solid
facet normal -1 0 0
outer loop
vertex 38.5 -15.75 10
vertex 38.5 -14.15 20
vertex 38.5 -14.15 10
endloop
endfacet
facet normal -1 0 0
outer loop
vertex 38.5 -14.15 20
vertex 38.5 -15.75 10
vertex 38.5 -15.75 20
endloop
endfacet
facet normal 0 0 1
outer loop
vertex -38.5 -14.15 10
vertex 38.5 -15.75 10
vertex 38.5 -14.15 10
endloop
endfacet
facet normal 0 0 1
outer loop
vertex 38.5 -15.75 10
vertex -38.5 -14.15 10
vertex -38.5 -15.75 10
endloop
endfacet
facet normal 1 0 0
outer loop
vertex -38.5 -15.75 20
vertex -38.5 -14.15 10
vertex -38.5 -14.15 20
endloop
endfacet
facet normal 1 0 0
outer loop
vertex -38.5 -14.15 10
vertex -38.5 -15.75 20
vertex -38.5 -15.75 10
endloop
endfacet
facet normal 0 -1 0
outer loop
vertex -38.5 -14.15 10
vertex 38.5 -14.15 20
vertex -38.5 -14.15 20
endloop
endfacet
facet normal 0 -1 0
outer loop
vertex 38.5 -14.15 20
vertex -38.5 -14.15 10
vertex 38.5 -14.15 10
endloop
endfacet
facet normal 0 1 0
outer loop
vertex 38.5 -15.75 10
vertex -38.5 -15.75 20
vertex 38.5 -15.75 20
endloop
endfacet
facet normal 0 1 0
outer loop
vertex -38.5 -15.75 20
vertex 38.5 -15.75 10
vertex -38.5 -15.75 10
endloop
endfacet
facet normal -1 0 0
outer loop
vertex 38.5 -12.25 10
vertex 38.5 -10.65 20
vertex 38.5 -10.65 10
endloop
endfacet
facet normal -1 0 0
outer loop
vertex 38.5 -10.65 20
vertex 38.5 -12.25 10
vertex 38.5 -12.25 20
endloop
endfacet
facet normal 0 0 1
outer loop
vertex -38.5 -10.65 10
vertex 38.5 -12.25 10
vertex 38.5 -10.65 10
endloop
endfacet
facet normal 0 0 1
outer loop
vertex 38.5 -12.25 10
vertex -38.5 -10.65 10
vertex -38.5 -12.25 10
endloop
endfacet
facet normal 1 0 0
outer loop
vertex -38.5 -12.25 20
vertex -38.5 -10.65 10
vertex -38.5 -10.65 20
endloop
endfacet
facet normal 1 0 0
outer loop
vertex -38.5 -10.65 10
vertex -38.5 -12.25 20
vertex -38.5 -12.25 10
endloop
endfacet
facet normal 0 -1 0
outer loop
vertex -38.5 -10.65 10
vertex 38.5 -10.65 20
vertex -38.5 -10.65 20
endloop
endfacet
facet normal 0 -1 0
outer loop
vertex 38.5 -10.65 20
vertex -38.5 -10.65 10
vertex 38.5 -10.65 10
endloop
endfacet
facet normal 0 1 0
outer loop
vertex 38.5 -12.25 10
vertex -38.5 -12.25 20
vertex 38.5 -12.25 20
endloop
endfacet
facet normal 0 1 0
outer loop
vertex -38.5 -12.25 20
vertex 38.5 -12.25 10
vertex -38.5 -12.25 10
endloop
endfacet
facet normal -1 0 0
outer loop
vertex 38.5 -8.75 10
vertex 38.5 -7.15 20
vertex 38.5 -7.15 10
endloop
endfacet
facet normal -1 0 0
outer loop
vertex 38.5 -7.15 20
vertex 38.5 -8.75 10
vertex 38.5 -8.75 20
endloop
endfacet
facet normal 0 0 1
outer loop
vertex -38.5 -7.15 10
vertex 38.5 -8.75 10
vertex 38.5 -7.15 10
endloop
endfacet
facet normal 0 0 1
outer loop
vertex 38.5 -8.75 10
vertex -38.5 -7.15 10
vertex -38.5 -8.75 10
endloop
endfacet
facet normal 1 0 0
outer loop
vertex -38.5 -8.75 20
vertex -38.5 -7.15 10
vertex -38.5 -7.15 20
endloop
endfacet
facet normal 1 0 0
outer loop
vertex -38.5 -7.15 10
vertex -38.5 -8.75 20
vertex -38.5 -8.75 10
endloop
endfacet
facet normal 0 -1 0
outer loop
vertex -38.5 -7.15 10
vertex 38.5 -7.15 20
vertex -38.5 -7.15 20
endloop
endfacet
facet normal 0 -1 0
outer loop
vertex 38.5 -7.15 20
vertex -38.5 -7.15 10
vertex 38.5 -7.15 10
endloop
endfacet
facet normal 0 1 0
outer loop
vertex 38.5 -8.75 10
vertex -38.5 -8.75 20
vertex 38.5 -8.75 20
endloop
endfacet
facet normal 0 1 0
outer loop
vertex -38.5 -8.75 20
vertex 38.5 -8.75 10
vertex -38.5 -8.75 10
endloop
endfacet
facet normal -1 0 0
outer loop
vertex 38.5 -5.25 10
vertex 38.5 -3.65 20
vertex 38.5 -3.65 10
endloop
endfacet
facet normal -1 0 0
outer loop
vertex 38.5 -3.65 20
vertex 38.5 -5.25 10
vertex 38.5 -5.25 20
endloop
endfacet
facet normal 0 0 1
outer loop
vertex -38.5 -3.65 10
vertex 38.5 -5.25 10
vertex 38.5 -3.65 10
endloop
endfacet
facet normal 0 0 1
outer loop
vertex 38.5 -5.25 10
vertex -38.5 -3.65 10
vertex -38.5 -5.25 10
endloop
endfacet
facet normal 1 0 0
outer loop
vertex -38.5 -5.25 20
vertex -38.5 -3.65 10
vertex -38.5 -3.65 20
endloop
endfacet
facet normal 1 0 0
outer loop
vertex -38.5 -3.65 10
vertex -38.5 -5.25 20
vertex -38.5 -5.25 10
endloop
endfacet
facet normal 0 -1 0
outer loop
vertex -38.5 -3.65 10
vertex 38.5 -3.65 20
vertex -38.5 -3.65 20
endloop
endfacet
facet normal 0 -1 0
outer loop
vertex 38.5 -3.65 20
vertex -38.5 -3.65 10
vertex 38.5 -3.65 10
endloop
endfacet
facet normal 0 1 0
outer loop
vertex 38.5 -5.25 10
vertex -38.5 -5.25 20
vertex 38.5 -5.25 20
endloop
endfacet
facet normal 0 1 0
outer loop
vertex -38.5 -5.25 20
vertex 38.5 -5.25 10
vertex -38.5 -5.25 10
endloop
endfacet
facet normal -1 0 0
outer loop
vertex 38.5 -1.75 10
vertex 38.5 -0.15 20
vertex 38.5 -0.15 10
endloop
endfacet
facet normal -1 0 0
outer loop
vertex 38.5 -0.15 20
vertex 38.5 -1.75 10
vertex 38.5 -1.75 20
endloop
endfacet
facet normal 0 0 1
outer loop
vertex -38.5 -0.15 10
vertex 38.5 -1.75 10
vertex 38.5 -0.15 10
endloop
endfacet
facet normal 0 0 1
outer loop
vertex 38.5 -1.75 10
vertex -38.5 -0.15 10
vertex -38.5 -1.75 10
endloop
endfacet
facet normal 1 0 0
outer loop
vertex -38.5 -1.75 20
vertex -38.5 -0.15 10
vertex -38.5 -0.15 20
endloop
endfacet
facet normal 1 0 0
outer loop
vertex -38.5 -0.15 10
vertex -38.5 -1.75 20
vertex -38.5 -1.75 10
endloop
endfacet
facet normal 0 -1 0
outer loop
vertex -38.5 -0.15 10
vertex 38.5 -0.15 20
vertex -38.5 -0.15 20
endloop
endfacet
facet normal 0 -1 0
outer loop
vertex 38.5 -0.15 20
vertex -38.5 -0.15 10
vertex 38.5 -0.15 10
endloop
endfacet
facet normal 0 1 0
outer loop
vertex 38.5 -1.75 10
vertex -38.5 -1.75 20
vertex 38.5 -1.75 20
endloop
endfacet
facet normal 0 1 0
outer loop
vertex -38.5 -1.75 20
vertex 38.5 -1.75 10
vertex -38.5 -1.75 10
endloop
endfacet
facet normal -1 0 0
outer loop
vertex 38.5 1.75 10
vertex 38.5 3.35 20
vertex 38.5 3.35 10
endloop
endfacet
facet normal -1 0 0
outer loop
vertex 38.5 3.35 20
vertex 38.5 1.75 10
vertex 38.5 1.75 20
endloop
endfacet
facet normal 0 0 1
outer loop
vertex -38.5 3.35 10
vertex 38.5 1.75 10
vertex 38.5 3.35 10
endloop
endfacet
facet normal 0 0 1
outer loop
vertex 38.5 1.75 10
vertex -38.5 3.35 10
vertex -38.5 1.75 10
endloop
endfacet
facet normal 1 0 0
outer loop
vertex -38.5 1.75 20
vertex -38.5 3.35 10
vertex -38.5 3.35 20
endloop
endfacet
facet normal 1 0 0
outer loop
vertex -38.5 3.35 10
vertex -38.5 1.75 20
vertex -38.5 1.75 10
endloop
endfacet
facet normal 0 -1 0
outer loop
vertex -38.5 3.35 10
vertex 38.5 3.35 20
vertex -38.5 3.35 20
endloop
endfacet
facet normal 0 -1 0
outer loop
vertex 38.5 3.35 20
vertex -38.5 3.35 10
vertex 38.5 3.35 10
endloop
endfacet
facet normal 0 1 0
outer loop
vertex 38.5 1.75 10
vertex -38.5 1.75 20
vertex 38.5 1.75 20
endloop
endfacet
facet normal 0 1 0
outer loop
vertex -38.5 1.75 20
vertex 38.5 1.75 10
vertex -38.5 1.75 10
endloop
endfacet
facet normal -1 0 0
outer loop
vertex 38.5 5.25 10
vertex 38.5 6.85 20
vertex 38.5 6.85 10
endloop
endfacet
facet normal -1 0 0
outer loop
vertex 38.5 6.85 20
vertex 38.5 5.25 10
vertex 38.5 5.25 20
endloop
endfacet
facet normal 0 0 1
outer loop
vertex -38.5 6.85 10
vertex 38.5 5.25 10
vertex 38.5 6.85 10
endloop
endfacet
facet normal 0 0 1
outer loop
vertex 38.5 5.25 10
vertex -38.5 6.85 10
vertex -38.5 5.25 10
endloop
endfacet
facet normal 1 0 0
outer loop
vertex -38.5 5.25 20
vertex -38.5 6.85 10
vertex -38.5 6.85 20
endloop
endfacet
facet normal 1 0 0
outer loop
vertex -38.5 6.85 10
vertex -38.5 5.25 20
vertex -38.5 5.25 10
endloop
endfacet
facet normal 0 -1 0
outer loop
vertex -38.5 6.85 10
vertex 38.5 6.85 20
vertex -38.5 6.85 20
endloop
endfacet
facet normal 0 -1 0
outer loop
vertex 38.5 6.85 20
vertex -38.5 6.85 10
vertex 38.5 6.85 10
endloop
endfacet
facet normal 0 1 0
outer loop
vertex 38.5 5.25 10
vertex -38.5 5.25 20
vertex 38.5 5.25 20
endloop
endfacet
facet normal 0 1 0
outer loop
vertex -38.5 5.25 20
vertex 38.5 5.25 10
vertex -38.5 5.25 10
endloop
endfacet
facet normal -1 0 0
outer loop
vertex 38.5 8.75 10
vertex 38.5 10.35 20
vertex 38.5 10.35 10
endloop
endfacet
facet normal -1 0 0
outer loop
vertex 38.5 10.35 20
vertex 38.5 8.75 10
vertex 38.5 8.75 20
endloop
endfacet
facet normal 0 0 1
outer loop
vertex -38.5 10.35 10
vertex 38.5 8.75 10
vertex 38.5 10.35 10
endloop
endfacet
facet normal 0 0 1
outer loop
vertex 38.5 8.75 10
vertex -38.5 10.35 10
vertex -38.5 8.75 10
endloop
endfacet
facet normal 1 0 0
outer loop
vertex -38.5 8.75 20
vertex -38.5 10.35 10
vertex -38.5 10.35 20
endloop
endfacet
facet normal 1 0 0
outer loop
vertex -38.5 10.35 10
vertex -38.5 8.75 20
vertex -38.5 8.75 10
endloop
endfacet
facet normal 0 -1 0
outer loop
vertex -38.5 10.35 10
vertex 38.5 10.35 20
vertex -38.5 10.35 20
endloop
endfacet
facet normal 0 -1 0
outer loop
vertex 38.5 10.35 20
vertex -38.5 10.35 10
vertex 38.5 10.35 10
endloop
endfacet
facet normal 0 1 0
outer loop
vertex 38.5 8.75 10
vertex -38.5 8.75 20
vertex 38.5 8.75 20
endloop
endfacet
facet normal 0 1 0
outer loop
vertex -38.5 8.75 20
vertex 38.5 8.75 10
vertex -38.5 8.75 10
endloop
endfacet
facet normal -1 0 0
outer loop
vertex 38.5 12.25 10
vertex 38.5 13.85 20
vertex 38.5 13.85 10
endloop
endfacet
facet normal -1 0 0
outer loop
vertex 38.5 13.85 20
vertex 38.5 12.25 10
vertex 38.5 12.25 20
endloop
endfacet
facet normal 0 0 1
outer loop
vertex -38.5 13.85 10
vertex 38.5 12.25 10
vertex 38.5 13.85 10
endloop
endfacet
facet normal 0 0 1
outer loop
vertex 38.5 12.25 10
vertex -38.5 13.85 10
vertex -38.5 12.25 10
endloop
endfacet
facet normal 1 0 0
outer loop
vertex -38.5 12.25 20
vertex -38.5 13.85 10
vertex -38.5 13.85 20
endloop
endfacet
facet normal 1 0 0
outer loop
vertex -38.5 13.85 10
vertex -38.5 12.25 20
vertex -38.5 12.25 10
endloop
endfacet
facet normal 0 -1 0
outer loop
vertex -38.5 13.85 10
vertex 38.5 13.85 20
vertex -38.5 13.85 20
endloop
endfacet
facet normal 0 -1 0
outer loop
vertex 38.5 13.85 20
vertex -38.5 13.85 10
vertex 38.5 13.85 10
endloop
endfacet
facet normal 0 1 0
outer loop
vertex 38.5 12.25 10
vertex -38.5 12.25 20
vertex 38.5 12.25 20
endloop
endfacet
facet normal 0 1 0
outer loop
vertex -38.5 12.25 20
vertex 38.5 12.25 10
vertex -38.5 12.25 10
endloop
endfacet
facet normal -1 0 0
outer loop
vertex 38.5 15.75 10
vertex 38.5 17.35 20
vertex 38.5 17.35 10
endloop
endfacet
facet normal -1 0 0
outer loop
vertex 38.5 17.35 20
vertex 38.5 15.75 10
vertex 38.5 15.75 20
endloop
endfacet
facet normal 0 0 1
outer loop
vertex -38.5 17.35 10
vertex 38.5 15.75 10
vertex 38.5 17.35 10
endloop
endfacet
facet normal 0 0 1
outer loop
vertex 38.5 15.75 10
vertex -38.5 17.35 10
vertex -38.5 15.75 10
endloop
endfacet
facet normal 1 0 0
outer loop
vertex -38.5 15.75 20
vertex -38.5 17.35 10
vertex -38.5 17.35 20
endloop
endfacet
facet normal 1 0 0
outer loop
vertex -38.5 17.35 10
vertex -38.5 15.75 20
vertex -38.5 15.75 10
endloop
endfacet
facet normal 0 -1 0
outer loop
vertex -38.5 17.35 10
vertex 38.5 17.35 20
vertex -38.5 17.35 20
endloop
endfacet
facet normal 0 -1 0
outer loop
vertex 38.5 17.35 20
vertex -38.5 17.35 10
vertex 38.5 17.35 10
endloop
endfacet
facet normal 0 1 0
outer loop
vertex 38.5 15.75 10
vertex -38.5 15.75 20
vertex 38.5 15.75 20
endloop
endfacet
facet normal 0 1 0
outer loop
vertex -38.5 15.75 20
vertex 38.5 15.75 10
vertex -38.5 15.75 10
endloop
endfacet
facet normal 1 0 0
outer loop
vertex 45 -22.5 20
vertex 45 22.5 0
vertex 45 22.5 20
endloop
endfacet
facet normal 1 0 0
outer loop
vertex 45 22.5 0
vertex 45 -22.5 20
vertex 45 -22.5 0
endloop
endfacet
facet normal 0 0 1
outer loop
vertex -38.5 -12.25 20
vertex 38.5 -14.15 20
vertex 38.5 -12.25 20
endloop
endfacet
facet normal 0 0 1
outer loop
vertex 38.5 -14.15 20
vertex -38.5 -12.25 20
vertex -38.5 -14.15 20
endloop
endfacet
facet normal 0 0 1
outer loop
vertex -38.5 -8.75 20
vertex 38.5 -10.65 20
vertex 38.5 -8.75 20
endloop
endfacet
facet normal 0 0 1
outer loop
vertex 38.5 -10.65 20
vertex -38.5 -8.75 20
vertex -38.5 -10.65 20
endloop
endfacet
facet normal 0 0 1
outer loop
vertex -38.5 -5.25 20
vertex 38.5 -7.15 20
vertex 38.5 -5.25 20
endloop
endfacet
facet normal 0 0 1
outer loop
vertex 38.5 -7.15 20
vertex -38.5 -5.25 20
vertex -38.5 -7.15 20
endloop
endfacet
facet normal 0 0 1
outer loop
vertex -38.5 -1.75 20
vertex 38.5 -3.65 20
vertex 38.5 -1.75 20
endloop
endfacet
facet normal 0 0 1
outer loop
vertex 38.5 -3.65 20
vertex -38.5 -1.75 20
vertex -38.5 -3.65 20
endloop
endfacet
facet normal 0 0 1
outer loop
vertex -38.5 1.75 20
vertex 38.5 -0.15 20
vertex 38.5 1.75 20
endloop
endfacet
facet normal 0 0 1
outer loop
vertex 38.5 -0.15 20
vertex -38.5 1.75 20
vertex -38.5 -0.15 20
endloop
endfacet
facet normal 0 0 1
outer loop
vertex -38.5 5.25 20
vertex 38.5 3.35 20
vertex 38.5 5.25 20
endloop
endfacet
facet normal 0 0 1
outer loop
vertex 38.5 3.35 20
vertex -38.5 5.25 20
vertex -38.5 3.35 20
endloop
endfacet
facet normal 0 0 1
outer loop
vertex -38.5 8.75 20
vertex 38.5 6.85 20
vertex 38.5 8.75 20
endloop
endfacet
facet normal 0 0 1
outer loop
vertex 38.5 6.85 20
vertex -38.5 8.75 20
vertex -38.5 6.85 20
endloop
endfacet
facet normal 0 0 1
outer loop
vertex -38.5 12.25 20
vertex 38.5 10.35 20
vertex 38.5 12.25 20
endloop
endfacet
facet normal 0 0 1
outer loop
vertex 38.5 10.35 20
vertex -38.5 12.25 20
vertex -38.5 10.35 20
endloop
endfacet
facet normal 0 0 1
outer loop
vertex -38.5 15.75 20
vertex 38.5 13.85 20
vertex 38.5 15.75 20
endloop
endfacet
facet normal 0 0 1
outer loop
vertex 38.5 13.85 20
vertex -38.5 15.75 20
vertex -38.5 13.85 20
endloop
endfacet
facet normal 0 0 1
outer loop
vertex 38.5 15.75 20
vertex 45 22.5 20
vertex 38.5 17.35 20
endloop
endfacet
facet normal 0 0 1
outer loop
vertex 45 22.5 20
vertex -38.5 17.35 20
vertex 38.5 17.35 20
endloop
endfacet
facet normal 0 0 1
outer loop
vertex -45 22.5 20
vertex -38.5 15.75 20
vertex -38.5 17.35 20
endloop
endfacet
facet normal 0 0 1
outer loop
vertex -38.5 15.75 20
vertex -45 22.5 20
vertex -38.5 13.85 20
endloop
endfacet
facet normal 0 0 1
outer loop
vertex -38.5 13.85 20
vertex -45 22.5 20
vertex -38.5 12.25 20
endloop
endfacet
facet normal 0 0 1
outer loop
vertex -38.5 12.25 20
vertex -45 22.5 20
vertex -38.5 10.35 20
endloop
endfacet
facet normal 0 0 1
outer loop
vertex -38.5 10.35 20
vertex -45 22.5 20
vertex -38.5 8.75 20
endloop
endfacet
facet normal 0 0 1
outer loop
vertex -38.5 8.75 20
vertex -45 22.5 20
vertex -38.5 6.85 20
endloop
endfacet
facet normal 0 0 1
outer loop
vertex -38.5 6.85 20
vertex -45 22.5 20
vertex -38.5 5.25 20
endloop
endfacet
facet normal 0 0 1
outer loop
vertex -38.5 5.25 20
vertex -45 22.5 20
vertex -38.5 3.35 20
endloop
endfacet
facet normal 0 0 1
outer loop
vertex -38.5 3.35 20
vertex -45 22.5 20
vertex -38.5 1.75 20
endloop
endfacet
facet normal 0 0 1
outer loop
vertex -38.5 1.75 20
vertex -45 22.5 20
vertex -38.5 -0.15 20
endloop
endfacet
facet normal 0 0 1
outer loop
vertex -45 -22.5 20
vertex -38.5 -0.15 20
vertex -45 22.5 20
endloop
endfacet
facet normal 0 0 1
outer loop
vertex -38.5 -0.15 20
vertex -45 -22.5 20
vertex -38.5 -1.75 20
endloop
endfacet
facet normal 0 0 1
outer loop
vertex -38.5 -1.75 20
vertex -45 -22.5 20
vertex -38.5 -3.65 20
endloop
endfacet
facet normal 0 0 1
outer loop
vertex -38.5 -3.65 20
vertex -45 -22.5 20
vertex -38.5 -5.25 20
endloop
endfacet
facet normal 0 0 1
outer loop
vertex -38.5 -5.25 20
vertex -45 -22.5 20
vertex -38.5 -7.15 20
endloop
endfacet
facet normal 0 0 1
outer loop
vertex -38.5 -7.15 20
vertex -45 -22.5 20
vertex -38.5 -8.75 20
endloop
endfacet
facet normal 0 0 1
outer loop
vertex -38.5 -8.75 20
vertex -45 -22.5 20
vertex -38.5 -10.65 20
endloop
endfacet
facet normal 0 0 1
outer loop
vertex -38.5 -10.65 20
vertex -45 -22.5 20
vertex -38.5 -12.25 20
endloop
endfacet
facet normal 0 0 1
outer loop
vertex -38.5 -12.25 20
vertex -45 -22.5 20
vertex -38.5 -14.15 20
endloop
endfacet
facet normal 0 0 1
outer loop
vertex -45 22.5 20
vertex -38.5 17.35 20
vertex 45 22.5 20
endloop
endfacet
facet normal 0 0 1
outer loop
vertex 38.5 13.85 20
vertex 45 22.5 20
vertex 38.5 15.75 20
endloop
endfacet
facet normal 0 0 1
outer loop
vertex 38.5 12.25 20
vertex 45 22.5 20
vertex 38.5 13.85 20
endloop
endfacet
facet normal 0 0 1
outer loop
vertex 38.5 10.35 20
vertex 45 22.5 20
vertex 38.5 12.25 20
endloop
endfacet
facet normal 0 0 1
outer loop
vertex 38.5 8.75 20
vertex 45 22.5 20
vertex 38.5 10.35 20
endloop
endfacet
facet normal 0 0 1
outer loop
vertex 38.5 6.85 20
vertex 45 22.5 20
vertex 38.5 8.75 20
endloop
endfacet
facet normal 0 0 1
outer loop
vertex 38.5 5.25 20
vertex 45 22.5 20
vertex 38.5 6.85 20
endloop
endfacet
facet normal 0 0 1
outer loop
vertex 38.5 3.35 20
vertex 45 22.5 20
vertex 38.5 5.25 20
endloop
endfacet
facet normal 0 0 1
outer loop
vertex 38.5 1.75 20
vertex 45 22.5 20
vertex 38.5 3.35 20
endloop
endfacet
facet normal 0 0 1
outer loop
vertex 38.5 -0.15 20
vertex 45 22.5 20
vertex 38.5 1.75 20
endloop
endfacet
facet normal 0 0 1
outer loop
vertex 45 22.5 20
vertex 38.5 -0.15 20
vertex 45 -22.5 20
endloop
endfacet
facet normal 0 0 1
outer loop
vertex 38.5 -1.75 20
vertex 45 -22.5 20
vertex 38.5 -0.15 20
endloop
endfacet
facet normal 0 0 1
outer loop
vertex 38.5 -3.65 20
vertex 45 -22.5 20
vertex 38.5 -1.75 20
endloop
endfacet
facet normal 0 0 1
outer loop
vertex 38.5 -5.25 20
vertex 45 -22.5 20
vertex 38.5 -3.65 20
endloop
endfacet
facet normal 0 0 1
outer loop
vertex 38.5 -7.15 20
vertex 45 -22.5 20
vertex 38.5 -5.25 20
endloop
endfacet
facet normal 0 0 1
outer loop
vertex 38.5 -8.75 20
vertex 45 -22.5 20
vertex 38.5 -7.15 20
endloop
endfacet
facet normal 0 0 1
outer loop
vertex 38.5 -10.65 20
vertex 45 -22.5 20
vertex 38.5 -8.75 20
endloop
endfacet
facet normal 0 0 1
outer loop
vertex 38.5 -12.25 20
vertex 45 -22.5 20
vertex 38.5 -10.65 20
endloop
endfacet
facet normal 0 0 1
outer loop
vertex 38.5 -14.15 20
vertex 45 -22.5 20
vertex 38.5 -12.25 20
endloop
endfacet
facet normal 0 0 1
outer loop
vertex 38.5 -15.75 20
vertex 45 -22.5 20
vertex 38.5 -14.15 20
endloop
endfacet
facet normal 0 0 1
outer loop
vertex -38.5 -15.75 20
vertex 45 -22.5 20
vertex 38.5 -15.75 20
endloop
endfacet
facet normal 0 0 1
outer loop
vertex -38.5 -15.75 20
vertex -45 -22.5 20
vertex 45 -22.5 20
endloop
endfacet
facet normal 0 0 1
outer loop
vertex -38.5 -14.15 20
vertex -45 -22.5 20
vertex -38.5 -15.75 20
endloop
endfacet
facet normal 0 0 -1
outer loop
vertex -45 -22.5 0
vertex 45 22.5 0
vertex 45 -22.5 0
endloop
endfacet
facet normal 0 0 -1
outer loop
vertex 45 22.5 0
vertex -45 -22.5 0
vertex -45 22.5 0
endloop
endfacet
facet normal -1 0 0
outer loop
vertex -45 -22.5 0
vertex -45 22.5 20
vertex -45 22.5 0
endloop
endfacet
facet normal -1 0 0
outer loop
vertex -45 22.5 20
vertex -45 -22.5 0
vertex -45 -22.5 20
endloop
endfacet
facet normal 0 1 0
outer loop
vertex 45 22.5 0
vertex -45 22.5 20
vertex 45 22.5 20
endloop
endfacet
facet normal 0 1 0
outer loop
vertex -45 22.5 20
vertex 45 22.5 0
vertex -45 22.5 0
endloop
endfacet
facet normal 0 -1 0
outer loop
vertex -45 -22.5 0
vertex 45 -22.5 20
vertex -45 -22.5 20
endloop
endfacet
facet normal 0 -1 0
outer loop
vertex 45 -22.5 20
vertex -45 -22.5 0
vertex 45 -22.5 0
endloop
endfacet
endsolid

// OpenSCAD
// Microscope slide drying rack
// Units: mm

// ---- Block ----
block_l = 90;      // block length (X)
block_w = 45;      // block width (Y)
block_h = 20;      // block height (Z)

// ---- Slots ----
slot_n     = 10;   // number of slots
slot_len   = 77;   // slot length along X
slot_w     = 1.6;  // slot width along Y
slot_depth = 10;   // slot depth from top face
slot_pitch = 3.5;  // centre-to-centre spacing along Y

// ---- Misc ----
eps = 0.5;         // overcut past faces
$fn = 64;

difference() {
    // Base block, centred in X/Y, resting on z = 0
    translate([-block_l/2, -block_w/2, 0])
        cube([block_l, block_w, block_h]);

    // Slot group centred on block in X and Y
    for (i = [0 : slot_n - 1]) {
        y = (i - (slot_n - 1)/2) * slot_pitch;
        translate([-slot_len/2, y, block_h - slot_depth])
            cube([slot_len, slot_w, slot_depth + eps]);
    }
}
